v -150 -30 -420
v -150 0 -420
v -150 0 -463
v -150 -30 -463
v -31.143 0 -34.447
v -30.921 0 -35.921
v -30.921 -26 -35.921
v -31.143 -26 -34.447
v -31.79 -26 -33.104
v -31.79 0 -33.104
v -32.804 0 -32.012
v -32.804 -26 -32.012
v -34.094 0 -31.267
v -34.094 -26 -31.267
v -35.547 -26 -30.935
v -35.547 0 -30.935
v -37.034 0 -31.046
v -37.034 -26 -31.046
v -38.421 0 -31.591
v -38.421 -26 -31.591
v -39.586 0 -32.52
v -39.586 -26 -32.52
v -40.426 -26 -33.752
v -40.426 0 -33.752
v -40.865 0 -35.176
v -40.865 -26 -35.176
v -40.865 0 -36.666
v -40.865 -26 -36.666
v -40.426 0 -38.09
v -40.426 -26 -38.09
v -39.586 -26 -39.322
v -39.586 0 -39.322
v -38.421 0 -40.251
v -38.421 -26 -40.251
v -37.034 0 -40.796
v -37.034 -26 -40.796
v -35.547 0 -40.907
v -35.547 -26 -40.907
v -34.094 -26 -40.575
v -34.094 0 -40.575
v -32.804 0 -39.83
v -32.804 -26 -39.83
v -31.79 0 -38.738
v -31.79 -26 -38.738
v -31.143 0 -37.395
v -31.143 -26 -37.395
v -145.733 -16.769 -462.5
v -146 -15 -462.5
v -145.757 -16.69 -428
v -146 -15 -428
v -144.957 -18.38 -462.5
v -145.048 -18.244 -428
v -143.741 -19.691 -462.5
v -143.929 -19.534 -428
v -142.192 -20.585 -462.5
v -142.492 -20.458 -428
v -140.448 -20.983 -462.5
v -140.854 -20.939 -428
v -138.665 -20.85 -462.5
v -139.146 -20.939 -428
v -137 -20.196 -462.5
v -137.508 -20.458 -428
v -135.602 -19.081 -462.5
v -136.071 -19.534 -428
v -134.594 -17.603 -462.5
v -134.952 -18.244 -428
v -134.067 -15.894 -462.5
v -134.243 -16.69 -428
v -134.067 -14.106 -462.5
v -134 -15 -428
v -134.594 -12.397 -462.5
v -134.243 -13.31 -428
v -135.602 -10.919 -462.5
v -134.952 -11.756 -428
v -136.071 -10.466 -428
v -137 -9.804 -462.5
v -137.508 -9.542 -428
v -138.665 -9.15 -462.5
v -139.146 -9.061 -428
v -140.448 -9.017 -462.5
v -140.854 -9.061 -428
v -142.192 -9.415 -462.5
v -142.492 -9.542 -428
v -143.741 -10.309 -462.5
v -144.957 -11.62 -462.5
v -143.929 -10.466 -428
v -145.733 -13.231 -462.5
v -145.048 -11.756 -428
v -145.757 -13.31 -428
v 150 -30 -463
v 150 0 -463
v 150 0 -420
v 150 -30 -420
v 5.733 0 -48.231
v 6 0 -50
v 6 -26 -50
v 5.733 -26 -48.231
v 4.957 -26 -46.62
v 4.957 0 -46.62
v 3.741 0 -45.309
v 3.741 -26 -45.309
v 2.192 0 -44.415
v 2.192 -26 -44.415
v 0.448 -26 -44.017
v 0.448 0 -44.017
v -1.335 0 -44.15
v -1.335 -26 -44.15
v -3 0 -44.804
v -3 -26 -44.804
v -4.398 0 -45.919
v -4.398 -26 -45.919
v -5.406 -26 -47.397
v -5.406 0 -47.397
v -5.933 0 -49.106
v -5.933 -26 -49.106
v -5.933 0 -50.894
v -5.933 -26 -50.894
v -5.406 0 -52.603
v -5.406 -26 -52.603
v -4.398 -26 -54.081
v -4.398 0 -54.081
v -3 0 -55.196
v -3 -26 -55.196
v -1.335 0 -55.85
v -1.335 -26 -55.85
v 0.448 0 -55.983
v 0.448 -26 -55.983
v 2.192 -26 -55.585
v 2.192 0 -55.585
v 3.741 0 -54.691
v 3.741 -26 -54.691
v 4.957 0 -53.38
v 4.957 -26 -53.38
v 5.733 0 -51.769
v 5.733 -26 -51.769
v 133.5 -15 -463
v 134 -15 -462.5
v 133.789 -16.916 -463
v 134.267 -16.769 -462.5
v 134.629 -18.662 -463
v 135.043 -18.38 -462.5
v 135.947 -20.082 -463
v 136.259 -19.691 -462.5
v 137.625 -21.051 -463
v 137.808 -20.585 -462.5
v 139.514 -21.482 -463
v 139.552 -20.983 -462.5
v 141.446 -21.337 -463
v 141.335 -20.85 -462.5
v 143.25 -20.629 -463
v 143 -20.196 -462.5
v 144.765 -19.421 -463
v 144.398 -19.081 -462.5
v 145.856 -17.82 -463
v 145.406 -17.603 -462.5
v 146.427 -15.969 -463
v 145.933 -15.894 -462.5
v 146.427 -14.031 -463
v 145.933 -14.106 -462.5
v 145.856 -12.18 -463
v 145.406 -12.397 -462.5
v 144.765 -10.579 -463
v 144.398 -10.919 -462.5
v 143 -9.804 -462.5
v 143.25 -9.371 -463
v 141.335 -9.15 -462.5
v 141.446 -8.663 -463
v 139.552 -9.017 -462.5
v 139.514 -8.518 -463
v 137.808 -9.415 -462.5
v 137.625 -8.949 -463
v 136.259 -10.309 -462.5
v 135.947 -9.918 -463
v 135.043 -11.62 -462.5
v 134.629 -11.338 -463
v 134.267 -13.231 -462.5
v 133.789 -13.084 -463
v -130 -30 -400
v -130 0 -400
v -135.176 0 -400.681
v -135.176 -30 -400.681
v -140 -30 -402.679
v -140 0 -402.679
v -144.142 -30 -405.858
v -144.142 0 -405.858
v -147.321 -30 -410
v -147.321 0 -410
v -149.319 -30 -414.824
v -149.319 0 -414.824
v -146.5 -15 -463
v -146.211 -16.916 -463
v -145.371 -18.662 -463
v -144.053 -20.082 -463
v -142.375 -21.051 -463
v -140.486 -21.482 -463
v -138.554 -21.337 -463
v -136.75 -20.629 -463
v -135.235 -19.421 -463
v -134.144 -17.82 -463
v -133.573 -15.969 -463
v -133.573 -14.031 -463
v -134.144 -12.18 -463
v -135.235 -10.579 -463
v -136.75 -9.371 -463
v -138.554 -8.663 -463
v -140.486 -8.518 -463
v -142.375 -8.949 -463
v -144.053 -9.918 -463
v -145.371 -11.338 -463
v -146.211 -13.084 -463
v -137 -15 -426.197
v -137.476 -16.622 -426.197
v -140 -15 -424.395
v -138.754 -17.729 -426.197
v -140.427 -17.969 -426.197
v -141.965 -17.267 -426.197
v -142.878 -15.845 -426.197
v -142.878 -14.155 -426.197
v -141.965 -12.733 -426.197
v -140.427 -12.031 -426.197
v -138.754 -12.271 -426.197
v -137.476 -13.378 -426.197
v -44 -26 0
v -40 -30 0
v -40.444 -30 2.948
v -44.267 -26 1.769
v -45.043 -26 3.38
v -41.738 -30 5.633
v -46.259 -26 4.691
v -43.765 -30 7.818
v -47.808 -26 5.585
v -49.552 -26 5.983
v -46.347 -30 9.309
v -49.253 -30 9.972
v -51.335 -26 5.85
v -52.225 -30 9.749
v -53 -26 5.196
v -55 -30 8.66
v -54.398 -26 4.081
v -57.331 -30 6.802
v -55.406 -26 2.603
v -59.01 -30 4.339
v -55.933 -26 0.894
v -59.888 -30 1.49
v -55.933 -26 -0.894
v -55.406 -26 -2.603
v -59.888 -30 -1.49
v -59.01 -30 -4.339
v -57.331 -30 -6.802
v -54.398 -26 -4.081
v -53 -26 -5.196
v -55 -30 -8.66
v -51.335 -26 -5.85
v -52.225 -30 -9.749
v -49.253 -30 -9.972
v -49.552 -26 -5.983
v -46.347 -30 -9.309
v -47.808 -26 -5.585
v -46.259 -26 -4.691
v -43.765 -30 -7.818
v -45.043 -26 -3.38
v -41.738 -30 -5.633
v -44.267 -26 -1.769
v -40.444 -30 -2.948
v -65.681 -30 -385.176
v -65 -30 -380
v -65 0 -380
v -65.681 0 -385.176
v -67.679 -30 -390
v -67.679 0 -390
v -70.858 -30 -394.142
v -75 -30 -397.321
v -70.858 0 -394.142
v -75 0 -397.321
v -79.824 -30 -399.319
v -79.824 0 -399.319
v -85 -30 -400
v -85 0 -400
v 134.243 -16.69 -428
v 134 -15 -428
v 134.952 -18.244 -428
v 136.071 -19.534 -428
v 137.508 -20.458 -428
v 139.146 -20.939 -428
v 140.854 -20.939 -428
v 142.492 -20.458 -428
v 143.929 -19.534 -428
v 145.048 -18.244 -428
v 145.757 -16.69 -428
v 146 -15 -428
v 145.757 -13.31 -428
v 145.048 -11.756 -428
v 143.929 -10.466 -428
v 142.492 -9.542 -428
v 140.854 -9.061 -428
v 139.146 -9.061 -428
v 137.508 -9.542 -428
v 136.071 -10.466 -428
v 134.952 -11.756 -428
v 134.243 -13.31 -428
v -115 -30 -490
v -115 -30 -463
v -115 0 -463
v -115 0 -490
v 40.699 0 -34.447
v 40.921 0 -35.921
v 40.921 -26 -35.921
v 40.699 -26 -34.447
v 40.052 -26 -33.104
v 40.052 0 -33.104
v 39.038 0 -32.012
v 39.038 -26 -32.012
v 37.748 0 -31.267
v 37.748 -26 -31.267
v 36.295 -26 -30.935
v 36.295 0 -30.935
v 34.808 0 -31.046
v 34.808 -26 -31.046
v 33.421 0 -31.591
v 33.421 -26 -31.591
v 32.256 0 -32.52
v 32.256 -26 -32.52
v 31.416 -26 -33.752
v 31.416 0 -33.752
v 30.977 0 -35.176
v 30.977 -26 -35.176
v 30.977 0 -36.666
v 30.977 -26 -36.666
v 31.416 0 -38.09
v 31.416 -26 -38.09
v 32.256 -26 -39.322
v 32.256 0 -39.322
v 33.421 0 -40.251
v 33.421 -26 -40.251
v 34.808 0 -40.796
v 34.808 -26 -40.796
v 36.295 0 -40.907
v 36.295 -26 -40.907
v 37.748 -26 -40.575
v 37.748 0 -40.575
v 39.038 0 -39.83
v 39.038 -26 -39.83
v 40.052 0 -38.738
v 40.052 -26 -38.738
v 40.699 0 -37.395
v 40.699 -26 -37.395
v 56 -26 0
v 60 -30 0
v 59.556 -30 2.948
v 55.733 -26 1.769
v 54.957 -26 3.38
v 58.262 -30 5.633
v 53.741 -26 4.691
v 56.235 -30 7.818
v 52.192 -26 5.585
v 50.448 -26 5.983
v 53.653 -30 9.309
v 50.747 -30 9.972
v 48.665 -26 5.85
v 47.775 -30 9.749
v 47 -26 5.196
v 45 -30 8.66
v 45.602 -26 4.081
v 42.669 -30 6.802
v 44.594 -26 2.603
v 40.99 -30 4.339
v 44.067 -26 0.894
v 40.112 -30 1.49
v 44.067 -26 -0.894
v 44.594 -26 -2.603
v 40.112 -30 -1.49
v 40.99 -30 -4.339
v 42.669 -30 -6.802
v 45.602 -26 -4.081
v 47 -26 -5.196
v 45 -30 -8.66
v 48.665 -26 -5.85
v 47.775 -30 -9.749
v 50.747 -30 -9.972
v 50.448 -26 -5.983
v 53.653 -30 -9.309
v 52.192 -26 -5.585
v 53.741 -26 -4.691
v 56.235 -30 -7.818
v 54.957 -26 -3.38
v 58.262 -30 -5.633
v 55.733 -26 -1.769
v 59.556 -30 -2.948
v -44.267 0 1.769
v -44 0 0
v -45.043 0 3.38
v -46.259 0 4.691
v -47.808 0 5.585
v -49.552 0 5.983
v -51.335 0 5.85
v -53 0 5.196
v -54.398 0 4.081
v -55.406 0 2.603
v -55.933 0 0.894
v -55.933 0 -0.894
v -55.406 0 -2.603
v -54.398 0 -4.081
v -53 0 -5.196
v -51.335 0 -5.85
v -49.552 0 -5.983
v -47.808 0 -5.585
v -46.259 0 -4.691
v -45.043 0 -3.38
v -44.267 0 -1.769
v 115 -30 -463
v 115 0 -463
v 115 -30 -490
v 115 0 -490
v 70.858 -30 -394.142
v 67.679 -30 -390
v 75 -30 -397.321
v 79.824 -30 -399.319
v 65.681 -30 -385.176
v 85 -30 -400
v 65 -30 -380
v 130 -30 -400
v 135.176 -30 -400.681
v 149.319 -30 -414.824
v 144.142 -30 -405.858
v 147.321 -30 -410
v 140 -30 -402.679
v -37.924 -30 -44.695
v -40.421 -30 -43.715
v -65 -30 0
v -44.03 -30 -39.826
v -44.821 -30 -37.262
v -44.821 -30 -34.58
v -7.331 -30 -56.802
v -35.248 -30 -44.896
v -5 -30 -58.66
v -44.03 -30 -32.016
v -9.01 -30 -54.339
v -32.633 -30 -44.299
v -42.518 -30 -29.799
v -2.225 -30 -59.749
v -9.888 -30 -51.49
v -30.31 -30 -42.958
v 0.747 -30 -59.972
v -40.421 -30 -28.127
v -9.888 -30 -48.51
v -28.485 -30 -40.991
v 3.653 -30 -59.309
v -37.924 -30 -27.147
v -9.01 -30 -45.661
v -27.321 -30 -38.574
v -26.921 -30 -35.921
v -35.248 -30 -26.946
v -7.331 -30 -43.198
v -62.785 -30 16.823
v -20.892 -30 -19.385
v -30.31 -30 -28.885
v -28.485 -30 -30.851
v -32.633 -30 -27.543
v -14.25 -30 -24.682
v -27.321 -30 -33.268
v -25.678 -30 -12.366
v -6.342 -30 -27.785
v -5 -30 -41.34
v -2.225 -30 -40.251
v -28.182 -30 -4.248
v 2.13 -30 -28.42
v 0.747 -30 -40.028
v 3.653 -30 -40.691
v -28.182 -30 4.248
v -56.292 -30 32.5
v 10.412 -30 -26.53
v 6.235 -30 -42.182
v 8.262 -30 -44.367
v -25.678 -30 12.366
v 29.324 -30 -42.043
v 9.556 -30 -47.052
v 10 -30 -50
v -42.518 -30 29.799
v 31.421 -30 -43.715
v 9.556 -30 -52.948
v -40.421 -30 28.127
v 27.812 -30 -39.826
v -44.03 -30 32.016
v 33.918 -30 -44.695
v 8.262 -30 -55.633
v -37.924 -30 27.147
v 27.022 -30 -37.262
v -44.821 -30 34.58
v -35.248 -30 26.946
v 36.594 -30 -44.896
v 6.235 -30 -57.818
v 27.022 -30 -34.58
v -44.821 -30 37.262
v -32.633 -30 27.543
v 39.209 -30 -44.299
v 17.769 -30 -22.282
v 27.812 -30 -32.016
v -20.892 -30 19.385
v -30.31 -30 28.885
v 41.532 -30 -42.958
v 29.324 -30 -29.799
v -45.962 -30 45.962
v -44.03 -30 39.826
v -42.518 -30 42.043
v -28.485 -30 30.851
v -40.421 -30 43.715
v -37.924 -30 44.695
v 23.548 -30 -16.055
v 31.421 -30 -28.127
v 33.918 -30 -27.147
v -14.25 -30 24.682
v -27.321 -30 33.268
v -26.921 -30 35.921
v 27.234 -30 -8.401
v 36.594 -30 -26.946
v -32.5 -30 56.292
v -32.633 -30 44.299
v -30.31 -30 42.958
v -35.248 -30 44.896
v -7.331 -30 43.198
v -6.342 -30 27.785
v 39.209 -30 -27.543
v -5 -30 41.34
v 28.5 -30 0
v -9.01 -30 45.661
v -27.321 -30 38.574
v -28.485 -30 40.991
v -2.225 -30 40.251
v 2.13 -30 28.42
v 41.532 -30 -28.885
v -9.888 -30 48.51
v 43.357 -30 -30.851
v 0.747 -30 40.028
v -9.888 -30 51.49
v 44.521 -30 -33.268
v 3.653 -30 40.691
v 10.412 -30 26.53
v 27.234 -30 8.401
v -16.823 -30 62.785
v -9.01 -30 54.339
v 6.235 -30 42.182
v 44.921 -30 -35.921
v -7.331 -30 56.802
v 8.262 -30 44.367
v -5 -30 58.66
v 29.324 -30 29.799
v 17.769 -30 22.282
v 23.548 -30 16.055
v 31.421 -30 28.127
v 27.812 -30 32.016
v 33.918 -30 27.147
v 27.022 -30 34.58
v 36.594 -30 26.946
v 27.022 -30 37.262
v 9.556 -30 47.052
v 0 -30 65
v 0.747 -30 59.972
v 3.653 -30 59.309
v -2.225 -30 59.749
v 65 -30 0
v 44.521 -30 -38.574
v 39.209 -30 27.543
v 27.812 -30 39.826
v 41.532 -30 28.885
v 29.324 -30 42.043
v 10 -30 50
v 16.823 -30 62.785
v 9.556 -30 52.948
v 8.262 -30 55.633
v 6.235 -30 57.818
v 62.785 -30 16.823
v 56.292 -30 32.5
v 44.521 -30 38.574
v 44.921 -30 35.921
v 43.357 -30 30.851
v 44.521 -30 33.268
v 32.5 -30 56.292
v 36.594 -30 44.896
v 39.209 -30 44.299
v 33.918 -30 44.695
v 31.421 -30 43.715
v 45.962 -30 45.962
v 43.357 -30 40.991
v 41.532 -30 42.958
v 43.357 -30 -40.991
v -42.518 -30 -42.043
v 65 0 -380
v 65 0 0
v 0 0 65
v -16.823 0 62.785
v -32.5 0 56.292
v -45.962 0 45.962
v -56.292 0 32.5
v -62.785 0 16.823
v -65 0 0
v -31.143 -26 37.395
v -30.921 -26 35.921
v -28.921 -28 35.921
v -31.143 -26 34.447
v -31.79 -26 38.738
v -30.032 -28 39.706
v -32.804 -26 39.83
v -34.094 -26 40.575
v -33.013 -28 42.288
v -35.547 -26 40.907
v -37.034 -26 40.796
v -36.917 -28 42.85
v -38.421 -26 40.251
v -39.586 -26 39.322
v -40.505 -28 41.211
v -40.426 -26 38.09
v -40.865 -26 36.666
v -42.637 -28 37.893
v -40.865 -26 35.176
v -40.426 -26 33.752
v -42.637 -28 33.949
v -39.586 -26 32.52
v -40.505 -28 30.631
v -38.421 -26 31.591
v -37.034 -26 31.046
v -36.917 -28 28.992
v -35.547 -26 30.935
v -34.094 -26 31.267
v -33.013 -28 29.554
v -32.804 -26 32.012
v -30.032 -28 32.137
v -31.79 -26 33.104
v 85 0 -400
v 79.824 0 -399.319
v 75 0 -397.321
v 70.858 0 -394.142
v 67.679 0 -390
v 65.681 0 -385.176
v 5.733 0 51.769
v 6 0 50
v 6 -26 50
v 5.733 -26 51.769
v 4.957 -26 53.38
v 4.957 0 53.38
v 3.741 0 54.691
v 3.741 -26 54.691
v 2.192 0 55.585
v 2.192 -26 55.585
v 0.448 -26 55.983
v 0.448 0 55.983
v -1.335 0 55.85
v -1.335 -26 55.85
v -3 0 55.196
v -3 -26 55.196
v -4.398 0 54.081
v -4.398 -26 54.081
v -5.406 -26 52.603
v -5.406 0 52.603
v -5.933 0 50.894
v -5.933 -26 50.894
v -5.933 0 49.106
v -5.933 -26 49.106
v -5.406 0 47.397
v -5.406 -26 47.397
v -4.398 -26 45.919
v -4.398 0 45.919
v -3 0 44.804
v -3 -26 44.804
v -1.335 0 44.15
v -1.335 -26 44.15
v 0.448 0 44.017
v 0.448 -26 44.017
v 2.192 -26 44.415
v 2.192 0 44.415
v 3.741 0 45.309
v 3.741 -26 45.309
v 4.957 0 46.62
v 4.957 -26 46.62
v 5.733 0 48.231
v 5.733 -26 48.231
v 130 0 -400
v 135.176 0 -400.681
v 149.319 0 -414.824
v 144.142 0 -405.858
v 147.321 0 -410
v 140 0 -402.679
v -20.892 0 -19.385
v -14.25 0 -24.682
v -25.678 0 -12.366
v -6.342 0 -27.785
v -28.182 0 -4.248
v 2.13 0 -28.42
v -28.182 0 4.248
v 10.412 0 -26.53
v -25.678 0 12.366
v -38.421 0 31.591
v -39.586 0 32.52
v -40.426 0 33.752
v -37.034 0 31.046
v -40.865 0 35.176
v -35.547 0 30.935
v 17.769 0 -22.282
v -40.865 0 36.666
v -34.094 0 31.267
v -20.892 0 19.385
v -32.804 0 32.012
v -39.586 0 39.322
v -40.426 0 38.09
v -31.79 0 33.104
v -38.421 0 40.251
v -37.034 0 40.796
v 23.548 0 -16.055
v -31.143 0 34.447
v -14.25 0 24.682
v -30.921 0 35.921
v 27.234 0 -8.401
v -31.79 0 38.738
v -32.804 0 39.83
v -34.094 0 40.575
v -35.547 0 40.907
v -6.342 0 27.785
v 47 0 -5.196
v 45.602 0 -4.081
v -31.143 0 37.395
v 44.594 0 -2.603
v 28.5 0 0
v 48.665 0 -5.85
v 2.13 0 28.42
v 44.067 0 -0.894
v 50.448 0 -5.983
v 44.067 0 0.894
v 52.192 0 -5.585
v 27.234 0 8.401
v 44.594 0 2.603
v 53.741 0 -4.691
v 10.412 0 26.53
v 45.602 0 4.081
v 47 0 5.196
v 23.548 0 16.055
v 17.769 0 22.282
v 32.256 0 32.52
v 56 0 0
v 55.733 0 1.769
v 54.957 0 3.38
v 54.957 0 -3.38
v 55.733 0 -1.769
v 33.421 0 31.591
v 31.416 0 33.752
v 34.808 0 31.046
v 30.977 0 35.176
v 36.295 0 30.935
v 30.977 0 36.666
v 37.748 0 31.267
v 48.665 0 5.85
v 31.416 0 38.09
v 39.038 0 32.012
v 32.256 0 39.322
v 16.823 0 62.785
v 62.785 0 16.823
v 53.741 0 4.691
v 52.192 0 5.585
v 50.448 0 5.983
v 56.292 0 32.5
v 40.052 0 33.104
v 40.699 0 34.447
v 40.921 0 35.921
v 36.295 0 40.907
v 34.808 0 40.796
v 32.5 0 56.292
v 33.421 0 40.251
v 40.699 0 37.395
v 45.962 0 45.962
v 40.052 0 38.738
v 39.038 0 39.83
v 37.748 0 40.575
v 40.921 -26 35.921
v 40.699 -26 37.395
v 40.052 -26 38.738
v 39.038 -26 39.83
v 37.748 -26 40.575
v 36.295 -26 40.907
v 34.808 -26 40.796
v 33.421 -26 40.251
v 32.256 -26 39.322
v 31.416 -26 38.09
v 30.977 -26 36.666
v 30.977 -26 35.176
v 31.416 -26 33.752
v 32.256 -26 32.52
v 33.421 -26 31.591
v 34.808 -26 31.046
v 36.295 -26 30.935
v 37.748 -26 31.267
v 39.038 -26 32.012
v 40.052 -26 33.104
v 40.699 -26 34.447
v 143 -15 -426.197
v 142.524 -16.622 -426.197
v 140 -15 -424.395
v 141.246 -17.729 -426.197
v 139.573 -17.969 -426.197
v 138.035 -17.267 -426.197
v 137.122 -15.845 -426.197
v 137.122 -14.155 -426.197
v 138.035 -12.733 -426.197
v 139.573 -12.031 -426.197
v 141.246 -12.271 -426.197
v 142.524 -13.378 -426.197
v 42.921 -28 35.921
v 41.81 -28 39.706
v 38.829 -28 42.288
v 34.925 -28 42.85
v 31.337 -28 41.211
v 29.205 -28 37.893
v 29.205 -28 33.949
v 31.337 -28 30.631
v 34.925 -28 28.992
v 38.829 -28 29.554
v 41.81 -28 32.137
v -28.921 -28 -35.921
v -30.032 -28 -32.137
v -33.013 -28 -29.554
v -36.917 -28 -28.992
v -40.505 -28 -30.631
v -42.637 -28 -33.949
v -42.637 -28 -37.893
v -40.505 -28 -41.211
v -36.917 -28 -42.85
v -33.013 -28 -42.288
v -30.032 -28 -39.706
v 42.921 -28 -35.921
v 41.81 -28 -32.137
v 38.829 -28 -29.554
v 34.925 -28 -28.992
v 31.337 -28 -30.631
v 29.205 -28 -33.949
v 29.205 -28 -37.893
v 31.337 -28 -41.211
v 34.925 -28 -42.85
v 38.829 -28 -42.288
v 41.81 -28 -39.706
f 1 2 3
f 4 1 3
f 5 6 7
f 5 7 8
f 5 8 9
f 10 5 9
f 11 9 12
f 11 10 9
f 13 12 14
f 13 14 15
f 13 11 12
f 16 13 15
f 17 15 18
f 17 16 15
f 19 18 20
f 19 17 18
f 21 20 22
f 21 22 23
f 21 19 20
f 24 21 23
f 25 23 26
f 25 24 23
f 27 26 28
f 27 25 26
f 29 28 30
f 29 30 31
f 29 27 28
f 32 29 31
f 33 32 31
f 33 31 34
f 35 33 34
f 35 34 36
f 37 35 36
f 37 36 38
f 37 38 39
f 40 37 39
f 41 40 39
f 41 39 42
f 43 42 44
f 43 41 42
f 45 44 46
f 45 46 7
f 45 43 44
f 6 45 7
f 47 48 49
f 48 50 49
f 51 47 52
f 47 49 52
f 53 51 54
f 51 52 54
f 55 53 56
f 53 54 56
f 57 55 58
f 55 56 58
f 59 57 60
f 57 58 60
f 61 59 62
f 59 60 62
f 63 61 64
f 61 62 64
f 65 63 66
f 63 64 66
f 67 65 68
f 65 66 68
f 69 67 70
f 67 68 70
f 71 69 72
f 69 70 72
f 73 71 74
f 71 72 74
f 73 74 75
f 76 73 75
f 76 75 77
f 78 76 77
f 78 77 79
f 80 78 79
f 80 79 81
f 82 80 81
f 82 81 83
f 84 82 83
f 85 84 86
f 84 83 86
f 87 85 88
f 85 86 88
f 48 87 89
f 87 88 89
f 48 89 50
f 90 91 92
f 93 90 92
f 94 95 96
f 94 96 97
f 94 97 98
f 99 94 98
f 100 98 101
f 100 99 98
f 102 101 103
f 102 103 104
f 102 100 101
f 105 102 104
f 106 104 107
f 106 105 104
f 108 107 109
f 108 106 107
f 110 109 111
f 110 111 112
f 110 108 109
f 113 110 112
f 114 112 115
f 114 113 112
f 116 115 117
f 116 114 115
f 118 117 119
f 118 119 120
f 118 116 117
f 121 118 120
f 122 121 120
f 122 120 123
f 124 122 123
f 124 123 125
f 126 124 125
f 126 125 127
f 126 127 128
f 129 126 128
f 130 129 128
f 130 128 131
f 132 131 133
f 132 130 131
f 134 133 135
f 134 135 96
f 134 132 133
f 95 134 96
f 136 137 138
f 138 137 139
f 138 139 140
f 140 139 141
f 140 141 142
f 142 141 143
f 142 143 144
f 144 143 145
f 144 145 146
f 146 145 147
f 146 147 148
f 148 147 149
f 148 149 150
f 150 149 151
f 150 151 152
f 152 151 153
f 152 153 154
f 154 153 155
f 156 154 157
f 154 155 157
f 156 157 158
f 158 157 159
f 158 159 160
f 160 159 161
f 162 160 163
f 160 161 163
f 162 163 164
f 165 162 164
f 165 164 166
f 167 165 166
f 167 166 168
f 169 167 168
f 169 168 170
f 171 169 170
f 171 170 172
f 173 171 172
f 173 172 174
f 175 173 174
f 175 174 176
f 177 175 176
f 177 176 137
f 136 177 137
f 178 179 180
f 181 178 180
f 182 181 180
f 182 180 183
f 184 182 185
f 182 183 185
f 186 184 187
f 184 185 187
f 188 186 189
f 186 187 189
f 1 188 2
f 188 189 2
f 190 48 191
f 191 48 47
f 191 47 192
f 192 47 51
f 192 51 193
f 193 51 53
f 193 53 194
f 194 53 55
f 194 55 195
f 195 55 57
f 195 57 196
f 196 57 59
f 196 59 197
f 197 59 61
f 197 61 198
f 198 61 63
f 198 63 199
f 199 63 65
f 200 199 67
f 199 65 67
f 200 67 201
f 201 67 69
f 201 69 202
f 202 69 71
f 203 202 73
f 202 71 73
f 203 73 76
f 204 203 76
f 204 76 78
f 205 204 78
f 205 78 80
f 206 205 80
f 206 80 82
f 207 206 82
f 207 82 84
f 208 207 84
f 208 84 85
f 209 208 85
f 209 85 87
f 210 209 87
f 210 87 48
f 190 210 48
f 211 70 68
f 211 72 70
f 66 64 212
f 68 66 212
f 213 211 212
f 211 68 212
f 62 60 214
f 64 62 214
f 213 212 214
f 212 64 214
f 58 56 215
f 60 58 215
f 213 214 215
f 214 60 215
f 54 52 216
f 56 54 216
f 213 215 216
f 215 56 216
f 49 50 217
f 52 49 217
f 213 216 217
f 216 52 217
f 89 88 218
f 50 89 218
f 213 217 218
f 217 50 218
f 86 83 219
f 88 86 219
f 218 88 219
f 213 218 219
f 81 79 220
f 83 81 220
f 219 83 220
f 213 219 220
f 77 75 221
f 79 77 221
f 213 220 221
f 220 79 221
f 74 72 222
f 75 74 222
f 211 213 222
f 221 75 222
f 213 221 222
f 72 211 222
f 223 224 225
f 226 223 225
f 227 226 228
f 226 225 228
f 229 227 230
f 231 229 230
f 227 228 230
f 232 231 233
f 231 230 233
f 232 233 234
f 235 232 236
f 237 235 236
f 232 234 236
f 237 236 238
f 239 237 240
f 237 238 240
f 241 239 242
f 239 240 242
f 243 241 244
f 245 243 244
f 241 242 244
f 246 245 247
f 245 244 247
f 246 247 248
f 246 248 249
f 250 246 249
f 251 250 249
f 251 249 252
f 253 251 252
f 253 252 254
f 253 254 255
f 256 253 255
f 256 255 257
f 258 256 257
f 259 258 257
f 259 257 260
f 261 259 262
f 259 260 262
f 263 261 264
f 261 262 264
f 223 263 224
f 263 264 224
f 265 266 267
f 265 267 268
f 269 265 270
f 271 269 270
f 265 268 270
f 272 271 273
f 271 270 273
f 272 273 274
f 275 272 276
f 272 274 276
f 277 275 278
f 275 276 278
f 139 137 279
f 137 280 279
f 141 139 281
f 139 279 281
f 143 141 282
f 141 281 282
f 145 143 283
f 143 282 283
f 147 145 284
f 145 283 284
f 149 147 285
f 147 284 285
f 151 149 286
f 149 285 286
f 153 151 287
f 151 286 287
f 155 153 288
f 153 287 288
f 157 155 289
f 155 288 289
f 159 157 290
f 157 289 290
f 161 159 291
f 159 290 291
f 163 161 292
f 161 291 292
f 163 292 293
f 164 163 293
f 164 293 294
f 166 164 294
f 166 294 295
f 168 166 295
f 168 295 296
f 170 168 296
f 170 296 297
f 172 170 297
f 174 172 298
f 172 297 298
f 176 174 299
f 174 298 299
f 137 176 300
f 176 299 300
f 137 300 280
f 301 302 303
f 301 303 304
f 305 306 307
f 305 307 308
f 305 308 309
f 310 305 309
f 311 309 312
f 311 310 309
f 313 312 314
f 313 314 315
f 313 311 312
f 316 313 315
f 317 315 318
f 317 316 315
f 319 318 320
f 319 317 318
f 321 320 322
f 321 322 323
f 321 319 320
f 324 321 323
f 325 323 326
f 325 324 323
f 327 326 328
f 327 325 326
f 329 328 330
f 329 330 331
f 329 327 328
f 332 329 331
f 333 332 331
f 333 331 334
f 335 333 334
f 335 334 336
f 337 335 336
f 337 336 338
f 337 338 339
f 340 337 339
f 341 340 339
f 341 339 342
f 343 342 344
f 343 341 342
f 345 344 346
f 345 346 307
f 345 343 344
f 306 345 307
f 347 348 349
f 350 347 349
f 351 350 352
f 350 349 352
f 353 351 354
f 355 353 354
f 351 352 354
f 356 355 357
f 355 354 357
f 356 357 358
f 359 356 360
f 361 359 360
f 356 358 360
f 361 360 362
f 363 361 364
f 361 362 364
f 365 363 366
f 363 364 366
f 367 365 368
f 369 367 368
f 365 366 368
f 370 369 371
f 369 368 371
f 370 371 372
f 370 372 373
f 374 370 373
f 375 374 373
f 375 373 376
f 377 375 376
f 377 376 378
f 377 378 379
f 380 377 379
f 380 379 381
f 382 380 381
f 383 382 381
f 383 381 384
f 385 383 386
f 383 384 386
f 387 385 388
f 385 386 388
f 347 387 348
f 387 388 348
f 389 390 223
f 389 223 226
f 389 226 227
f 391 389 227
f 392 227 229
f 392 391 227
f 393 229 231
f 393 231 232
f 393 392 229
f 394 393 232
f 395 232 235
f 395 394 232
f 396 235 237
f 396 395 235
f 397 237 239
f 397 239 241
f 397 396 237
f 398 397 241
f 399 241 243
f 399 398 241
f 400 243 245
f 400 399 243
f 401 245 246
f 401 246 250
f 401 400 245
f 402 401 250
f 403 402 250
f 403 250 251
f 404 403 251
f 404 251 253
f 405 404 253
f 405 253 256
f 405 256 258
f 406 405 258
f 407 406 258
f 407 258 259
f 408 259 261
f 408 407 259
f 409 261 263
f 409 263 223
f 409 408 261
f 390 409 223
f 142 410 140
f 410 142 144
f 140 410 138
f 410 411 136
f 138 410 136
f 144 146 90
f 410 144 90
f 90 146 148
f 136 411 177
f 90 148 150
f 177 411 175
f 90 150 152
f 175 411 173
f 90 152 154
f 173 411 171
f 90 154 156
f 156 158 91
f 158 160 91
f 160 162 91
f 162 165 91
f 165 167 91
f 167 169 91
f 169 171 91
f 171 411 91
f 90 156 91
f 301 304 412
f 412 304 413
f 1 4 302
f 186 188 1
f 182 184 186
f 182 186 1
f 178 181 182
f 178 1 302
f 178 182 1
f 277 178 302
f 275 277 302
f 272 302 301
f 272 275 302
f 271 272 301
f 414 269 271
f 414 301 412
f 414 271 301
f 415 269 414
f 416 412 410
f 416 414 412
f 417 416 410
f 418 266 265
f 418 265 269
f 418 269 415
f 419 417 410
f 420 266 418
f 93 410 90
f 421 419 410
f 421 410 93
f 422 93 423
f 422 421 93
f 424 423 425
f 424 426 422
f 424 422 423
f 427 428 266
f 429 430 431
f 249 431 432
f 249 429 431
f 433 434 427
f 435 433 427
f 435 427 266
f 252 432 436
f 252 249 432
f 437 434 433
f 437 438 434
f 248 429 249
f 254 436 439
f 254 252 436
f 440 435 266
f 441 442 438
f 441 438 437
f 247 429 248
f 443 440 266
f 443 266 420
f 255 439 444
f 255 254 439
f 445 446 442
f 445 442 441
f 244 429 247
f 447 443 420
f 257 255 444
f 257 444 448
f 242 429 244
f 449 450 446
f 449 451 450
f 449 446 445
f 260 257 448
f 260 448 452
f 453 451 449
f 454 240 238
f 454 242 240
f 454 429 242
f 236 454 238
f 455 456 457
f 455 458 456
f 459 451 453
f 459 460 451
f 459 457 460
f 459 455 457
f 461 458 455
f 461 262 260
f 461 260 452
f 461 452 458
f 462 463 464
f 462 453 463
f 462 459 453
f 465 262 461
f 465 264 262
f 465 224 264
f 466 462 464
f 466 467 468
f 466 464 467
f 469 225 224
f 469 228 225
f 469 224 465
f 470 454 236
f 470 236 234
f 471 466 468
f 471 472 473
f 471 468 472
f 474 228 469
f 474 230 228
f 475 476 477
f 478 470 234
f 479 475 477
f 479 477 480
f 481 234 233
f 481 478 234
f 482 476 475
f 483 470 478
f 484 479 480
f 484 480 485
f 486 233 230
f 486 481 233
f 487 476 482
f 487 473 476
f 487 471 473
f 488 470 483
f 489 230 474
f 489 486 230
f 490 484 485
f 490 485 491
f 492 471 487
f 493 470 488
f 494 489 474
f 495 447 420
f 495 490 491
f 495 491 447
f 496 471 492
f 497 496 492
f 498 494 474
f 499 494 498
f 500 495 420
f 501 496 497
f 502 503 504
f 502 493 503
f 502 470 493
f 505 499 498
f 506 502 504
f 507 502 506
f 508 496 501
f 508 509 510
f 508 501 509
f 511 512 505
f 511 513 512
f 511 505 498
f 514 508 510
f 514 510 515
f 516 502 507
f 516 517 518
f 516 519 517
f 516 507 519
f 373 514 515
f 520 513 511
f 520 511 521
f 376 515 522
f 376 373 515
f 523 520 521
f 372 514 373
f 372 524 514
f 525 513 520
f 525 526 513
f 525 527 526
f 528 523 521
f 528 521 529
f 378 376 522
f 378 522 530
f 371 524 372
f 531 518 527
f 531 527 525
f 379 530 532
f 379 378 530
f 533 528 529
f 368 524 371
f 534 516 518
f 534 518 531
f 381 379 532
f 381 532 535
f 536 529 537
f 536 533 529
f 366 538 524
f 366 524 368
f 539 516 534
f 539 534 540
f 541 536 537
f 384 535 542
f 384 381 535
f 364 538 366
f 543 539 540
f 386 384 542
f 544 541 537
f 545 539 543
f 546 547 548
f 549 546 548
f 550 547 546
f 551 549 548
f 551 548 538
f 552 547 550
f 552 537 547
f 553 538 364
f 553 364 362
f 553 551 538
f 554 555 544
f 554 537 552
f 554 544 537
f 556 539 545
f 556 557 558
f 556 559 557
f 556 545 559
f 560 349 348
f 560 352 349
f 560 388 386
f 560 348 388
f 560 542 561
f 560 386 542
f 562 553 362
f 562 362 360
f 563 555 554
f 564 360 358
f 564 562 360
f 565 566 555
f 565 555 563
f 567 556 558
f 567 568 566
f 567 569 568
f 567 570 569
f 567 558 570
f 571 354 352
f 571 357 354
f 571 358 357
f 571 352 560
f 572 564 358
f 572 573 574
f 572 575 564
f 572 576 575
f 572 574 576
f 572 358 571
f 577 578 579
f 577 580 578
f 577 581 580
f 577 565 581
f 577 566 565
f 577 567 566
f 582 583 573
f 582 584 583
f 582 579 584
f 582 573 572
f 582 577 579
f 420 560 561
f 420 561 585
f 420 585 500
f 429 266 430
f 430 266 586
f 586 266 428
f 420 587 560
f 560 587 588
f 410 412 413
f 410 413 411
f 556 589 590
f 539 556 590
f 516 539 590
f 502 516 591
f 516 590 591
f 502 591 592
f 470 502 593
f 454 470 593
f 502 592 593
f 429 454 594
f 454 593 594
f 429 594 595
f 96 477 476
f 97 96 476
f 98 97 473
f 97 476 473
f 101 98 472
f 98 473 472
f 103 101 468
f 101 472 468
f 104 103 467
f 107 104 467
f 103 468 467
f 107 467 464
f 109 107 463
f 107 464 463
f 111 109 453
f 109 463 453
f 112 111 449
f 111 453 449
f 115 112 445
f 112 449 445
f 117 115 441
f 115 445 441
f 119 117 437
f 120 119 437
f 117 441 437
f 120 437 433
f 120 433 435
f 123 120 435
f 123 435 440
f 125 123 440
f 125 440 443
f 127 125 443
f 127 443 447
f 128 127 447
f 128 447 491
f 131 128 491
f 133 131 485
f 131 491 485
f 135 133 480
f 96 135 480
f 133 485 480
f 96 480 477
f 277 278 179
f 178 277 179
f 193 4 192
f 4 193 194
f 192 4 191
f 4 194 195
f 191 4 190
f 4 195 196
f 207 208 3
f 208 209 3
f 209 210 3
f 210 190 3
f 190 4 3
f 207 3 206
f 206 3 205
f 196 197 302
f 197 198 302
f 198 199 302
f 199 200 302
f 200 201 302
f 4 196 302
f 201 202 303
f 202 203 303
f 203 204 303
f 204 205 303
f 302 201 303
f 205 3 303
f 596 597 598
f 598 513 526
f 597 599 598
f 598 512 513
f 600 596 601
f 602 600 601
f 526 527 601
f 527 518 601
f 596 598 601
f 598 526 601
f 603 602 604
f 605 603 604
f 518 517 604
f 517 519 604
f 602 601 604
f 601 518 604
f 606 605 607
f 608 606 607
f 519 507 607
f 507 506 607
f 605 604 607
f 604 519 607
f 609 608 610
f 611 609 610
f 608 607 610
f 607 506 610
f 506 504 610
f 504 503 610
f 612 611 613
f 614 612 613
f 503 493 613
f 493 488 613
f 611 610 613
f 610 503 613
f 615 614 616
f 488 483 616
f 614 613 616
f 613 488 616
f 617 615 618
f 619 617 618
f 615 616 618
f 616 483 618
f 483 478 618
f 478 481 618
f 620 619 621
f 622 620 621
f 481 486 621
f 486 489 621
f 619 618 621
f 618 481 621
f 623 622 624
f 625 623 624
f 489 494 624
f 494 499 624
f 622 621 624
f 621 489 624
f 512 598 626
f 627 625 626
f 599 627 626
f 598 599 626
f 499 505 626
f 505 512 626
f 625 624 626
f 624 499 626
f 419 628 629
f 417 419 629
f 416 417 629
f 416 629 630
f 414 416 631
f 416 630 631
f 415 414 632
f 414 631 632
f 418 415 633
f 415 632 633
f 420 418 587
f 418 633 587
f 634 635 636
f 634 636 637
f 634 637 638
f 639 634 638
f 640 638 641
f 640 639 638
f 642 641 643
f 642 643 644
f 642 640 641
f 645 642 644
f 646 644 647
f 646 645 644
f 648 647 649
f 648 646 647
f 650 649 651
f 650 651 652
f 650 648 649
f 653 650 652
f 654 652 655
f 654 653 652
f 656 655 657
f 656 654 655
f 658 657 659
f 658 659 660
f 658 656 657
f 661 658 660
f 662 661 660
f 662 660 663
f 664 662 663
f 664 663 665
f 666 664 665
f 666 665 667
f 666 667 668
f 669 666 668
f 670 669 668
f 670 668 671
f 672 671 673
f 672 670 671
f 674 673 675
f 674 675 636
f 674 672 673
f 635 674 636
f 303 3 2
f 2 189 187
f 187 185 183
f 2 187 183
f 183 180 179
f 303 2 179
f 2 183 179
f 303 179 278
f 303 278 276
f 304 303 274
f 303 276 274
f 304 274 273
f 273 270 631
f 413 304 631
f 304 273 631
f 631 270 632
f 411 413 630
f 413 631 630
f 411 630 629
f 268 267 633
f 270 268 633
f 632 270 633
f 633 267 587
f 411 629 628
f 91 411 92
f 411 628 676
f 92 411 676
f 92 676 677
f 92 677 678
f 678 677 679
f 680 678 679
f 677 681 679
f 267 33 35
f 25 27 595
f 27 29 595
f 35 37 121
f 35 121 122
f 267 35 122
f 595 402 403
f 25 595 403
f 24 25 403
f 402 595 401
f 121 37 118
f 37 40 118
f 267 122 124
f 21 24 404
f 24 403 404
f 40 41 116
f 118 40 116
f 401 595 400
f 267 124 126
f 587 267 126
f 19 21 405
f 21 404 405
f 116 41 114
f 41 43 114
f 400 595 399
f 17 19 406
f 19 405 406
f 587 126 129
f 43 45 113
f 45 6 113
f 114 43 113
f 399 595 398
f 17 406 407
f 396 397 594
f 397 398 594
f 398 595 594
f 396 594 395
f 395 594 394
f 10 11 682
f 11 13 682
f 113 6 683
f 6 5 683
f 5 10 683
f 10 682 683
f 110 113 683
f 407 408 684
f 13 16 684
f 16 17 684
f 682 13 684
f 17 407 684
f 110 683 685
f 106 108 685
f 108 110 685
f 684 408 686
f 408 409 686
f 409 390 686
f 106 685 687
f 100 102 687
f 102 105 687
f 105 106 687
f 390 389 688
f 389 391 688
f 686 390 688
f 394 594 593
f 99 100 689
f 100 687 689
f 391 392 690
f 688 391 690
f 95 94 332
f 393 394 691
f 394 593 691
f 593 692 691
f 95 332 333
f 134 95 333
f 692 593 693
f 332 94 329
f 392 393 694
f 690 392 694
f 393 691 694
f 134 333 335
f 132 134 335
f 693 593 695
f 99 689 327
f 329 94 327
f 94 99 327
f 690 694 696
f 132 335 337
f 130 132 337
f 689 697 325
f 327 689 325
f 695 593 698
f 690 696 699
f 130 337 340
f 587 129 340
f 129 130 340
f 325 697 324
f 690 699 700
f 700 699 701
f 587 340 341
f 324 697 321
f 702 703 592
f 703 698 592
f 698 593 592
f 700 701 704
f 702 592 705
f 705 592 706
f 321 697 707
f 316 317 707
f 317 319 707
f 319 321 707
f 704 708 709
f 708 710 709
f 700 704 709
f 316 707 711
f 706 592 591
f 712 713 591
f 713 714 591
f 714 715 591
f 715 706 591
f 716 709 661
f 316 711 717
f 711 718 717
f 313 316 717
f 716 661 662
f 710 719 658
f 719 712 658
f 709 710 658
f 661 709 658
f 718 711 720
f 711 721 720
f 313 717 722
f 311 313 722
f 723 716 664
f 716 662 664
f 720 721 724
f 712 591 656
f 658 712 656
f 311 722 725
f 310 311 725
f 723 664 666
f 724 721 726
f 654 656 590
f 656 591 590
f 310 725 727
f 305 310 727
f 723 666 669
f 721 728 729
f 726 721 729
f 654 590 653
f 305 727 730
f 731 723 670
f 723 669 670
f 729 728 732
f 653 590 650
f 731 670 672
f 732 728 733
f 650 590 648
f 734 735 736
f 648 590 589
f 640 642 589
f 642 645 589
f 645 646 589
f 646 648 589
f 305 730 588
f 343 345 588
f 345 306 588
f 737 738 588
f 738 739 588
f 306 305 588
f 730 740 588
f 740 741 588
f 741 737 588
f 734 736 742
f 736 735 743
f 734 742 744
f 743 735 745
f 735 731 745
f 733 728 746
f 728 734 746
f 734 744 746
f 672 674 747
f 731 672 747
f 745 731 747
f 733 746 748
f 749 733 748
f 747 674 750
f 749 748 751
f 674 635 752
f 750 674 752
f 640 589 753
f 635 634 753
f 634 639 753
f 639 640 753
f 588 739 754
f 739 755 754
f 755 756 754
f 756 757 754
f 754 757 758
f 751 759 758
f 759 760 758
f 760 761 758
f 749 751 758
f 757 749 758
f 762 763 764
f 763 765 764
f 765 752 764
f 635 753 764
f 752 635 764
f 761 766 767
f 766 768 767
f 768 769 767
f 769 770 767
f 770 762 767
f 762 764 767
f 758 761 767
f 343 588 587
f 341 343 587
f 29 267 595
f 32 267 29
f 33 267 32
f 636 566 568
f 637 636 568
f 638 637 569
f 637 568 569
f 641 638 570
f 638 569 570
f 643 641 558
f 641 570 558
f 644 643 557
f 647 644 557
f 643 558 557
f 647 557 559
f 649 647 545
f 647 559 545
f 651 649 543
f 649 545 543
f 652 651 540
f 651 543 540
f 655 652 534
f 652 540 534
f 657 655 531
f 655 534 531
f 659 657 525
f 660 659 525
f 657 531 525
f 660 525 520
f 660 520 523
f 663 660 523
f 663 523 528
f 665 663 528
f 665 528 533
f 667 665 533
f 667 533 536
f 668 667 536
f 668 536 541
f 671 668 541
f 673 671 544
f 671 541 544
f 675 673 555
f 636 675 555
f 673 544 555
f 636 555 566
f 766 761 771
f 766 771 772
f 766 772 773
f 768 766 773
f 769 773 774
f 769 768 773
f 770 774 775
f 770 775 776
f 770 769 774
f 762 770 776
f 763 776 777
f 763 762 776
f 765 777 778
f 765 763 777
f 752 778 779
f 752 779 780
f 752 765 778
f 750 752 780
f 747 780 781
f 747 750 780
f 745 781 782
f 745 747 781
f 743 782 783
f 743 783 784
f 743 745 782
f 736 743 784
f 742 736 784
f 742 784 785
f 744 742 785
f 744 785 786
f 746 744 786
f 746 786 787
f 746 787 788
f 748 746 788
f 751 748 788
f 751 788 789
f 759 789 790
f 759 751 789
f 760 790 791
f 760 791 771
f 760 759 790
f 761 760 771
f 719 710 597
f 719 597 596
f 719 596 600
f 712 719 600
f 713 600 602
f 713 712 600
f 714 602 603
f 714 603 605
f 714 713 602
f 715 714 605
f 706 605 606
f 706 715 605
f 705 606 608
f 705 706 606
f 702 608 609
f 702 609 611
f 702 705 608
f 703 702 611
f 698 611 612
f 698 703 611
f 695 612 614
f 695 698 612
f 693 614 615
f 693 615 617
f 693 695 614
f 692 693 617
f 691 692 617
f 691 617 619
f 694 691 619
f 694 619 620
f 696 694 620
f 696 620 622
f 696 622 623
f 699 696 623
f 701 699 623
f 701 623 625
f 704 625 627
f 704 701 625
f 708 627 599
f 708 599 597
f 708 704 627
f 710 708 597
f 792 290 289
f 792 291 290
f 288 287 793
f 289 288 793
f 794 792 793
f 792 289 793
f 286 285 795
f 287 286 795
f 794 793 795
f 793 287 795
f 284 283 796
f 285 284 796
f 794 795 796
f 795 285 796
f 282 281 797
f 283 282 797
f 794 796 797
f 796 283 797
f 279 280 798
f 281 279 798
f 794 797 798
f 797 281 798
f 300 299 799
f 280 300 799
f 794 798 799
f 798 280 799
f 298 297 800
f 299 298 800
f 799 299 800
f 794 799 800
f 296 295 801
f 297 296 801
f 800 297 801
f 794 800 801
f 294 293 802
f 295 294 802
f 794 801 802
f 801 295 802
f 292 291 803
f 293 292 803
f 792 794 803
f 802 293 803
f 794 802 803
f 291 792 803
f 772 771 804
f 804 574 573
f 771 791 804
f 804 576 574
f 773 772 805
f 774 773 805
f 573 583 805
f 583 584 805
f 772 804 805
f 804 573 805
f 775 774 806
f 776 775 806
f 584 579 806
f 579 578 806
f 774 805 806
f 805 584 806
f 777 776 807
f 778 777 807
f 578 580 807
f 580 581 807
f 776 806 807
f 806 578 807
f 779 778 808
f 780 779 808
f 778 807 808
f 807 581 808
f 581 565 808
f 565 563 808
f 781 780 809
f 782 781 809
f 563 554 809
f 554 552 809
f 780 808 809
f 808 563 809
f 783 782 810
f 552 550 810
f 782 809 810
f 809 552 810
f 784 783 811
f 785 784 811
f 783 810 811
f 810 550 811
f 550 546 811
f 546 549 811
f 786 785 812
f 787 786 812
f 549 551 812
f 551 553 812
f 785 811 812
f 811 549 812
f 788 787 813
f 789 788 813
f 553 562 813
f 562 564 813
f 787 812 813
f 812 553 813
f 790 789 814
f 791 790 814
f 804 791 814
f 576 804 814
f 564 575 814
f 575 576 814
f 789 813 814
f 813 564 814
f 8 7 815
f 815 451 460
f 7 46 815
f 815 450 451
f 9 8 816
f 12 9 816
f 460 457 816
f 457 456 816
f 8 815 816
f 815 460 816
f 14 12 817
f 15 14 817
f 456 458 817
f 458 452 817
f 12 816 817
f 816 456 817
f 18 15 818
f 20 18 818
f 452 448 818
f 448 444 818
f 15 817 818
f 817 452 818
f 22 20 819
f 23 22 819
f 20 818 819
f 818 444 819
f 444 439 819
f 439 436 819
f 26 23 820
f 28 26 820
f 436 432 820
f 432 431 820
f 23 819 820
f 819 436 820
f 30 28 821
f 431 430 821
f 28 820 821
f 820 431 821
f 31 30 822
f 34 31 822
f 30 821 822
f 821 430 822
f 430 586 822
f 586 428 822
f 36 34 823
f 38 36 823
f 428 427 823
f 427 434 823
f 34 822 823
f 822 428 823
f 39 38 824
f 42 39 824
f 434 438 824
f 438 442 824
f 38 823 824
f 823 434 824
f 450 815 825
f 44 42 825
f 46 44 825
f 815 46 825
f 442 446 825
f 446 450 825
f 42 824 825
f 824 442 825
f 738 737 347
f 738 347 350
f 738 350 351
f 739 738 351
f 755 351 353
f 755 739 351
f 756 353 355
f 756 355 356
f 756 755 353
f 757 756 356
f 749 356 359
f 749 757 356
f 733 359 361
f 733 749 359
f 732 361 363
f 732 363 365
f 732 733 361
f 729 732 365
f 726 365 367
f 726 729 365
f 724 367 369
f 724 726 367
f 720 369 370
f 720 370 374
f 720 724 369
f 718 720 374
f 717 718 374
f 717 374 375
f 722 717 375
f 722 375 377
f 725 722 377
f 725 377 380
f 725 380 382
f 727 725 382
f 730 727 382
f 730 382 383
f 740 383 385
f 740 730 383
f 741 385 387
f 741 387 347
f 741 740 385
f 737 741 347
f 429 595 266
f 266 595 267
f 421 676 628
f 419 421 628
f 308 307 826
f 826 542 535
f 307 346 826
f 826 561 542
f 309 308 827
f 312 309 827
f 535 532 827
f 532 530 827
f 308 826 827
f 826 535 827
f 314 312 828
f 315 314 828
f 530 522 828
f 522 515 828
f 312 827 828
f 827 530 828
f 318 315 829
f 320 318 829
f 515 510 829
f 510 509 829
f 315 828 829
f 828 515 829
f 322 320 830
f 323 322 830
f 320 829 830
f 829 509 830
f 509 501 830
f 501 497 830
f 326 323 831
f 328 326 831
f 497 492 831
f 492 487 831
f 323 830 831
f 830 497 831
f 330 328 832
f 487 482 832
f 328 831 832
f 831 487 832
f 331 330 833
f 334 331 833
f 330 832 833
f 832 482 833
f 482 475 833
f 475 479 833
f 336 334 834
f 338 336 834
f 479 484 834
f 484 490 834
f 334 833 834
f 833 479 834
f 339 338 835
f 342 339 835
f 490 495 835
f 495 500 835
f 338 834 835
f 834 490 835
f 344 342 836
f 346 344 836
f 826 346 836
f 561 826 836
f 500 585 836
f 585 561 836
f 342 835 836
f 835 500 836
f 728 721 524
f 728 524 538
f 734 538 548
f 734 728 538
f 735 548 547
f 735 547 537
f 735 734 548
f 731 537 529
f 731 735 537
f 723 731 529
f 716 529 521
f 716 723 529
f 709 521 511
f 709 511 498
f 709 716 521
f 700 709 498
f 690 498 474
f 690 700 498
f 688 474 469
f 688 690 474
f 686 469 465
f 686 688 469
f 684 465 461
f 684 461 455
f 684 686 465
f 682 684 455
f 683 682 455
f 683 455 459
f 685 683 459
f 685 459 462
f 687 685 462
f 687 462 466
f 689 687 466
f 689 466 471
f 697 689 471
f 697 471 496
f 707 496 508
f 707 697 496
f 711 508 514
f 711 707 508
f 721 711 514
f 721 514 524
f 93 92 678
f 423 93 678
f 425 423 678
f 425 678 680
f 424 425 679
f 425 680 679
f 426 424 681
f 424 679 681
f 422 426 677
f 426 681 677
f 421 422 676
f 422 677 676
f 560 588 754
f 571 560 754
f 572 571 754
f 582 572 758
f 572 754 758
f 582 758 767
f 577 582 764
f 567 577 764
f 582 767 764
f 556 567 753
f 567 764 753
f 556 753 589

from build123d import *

# Parameters (mm, degrees)
F0_R           = 5
F0_R_2         = 6
F0_R_3         = 28.5
F1_DEPTH       = 30
F2_SIZE        = 4
F4_D           = 12
F4_DEPTH       = 35
F4_CSINK_D     = 13
F4_CSINK_ANGLE = 90
F4_TIP         = 3.6051637142


with BuildPart() as f1:
    # F0 (on Front) → F1 (new body)
    with BuildSketch(Plane.XZ):
        with BuildLine():
            Line((65, -380), (65, 0))
            ThreePointArc((65, 0), (45.9619407771, 45.9619407771), (0, 65))
            ThreePointArc((0, 65), (-45.9619407771, 45.9619407771), (-65, 0))
            Line((-65, 0), (-65, -380))
            ThreePointArc((-65, -380), (-70.8578643763, -394.1421356237), (-85, -400))
            Line((-85, -400), (-130, -400))
            ThreePointArc((-130, -400), (-144.1421356237, -405.8578643763), (-150, -420))
            Line((-150, -420), (-150, -463))
            Line((-150, -463), (-115, -463))
            Line((-115, -463), (-115, -490))
            Line((-115, -490), (115, -490))
            Line((115, -490), (115, -463))
            Line((115, -463), (150, -463))
            Line((150, -463), (150, -420))
            ThreePointArc((150, -420), (144.1421356237, -405.8578643763), (130, -400))
            Line((130, -400), (85, -400))
            ThreePointArc((85, -400), (70.8578643763, -394.1421356237), (65, -380))
        make_face()
        with Locations((-35.9210244843, -35.9210244843)):
            Circle(F0_R, mode=Mode.SUBTRACT)
        with Locations((-50, 0)):
            Circle(F0_R_2, mode=Mode.SUBTRACT)
        with Locations((-35.9210244843, 35.9210244843)):
            Circle(F0_R, mode=Mode.SUBTRACT)
        with Locations((0, -50)):
            Circle(F0_R_2, mode=Mode.SUBTRACT)
        with Locations((35.9210244843, -35.9210244843)):
            Circle(F0_R, mode=Mode.SUBTRACT)
        Circle(F0_R_3, mode=Mode.SUBTRACT)
        with Locations((0, 50)):
            Circle(F0_R_2, mode=Mode.SUBTRACT)
        with Locations((35.9210244843, 35.9210244843)):
            Circle(F0_R, mode=Mode.SUBTRACT)
        with Locations((50, 0)):
            Circle(F0_R_2, mode=Mode.SUBTRACT)
    extrude(amount=F1_DEPTH)

    # F2
    f2_edges = [f1.edges().sort_by_distance(p)[0] for p in [
        (-40.921024, -30, 35.921024),
        (-6, -30, 50),
        (30.921024, -30, 35.921024),
        (44, -30, 0),
        (30.921024, -30, -35.921024),
        (-6, -30, -50),
        (-40.921024, -30, -35.921024),
        (-56, -30, 0),
    ]]
    chamfer(f2_edges, length=F2_SIZE)

    # F4
    with Locations(Plane(origin=(0, 0, -463), x_dir=(1, 0, 0), z_dir=(0, 0, -1))):
        with Locations((-140, 15), (140, 15)):
            CounterSinkHole(F4_D / 2, F4_CSINK_D / 2, depth=F4_DEPTH, counter_sink_angle=F4_CSINK_ANGLE)
            with Locations((0, 0, -(F4_DEPTH + F4_TIP / 2))):  # 118° drill point
                Cone(0, F4_D / 2, F4_TIP, mode=Mode.SUBTRACT)


solid = f1.part
